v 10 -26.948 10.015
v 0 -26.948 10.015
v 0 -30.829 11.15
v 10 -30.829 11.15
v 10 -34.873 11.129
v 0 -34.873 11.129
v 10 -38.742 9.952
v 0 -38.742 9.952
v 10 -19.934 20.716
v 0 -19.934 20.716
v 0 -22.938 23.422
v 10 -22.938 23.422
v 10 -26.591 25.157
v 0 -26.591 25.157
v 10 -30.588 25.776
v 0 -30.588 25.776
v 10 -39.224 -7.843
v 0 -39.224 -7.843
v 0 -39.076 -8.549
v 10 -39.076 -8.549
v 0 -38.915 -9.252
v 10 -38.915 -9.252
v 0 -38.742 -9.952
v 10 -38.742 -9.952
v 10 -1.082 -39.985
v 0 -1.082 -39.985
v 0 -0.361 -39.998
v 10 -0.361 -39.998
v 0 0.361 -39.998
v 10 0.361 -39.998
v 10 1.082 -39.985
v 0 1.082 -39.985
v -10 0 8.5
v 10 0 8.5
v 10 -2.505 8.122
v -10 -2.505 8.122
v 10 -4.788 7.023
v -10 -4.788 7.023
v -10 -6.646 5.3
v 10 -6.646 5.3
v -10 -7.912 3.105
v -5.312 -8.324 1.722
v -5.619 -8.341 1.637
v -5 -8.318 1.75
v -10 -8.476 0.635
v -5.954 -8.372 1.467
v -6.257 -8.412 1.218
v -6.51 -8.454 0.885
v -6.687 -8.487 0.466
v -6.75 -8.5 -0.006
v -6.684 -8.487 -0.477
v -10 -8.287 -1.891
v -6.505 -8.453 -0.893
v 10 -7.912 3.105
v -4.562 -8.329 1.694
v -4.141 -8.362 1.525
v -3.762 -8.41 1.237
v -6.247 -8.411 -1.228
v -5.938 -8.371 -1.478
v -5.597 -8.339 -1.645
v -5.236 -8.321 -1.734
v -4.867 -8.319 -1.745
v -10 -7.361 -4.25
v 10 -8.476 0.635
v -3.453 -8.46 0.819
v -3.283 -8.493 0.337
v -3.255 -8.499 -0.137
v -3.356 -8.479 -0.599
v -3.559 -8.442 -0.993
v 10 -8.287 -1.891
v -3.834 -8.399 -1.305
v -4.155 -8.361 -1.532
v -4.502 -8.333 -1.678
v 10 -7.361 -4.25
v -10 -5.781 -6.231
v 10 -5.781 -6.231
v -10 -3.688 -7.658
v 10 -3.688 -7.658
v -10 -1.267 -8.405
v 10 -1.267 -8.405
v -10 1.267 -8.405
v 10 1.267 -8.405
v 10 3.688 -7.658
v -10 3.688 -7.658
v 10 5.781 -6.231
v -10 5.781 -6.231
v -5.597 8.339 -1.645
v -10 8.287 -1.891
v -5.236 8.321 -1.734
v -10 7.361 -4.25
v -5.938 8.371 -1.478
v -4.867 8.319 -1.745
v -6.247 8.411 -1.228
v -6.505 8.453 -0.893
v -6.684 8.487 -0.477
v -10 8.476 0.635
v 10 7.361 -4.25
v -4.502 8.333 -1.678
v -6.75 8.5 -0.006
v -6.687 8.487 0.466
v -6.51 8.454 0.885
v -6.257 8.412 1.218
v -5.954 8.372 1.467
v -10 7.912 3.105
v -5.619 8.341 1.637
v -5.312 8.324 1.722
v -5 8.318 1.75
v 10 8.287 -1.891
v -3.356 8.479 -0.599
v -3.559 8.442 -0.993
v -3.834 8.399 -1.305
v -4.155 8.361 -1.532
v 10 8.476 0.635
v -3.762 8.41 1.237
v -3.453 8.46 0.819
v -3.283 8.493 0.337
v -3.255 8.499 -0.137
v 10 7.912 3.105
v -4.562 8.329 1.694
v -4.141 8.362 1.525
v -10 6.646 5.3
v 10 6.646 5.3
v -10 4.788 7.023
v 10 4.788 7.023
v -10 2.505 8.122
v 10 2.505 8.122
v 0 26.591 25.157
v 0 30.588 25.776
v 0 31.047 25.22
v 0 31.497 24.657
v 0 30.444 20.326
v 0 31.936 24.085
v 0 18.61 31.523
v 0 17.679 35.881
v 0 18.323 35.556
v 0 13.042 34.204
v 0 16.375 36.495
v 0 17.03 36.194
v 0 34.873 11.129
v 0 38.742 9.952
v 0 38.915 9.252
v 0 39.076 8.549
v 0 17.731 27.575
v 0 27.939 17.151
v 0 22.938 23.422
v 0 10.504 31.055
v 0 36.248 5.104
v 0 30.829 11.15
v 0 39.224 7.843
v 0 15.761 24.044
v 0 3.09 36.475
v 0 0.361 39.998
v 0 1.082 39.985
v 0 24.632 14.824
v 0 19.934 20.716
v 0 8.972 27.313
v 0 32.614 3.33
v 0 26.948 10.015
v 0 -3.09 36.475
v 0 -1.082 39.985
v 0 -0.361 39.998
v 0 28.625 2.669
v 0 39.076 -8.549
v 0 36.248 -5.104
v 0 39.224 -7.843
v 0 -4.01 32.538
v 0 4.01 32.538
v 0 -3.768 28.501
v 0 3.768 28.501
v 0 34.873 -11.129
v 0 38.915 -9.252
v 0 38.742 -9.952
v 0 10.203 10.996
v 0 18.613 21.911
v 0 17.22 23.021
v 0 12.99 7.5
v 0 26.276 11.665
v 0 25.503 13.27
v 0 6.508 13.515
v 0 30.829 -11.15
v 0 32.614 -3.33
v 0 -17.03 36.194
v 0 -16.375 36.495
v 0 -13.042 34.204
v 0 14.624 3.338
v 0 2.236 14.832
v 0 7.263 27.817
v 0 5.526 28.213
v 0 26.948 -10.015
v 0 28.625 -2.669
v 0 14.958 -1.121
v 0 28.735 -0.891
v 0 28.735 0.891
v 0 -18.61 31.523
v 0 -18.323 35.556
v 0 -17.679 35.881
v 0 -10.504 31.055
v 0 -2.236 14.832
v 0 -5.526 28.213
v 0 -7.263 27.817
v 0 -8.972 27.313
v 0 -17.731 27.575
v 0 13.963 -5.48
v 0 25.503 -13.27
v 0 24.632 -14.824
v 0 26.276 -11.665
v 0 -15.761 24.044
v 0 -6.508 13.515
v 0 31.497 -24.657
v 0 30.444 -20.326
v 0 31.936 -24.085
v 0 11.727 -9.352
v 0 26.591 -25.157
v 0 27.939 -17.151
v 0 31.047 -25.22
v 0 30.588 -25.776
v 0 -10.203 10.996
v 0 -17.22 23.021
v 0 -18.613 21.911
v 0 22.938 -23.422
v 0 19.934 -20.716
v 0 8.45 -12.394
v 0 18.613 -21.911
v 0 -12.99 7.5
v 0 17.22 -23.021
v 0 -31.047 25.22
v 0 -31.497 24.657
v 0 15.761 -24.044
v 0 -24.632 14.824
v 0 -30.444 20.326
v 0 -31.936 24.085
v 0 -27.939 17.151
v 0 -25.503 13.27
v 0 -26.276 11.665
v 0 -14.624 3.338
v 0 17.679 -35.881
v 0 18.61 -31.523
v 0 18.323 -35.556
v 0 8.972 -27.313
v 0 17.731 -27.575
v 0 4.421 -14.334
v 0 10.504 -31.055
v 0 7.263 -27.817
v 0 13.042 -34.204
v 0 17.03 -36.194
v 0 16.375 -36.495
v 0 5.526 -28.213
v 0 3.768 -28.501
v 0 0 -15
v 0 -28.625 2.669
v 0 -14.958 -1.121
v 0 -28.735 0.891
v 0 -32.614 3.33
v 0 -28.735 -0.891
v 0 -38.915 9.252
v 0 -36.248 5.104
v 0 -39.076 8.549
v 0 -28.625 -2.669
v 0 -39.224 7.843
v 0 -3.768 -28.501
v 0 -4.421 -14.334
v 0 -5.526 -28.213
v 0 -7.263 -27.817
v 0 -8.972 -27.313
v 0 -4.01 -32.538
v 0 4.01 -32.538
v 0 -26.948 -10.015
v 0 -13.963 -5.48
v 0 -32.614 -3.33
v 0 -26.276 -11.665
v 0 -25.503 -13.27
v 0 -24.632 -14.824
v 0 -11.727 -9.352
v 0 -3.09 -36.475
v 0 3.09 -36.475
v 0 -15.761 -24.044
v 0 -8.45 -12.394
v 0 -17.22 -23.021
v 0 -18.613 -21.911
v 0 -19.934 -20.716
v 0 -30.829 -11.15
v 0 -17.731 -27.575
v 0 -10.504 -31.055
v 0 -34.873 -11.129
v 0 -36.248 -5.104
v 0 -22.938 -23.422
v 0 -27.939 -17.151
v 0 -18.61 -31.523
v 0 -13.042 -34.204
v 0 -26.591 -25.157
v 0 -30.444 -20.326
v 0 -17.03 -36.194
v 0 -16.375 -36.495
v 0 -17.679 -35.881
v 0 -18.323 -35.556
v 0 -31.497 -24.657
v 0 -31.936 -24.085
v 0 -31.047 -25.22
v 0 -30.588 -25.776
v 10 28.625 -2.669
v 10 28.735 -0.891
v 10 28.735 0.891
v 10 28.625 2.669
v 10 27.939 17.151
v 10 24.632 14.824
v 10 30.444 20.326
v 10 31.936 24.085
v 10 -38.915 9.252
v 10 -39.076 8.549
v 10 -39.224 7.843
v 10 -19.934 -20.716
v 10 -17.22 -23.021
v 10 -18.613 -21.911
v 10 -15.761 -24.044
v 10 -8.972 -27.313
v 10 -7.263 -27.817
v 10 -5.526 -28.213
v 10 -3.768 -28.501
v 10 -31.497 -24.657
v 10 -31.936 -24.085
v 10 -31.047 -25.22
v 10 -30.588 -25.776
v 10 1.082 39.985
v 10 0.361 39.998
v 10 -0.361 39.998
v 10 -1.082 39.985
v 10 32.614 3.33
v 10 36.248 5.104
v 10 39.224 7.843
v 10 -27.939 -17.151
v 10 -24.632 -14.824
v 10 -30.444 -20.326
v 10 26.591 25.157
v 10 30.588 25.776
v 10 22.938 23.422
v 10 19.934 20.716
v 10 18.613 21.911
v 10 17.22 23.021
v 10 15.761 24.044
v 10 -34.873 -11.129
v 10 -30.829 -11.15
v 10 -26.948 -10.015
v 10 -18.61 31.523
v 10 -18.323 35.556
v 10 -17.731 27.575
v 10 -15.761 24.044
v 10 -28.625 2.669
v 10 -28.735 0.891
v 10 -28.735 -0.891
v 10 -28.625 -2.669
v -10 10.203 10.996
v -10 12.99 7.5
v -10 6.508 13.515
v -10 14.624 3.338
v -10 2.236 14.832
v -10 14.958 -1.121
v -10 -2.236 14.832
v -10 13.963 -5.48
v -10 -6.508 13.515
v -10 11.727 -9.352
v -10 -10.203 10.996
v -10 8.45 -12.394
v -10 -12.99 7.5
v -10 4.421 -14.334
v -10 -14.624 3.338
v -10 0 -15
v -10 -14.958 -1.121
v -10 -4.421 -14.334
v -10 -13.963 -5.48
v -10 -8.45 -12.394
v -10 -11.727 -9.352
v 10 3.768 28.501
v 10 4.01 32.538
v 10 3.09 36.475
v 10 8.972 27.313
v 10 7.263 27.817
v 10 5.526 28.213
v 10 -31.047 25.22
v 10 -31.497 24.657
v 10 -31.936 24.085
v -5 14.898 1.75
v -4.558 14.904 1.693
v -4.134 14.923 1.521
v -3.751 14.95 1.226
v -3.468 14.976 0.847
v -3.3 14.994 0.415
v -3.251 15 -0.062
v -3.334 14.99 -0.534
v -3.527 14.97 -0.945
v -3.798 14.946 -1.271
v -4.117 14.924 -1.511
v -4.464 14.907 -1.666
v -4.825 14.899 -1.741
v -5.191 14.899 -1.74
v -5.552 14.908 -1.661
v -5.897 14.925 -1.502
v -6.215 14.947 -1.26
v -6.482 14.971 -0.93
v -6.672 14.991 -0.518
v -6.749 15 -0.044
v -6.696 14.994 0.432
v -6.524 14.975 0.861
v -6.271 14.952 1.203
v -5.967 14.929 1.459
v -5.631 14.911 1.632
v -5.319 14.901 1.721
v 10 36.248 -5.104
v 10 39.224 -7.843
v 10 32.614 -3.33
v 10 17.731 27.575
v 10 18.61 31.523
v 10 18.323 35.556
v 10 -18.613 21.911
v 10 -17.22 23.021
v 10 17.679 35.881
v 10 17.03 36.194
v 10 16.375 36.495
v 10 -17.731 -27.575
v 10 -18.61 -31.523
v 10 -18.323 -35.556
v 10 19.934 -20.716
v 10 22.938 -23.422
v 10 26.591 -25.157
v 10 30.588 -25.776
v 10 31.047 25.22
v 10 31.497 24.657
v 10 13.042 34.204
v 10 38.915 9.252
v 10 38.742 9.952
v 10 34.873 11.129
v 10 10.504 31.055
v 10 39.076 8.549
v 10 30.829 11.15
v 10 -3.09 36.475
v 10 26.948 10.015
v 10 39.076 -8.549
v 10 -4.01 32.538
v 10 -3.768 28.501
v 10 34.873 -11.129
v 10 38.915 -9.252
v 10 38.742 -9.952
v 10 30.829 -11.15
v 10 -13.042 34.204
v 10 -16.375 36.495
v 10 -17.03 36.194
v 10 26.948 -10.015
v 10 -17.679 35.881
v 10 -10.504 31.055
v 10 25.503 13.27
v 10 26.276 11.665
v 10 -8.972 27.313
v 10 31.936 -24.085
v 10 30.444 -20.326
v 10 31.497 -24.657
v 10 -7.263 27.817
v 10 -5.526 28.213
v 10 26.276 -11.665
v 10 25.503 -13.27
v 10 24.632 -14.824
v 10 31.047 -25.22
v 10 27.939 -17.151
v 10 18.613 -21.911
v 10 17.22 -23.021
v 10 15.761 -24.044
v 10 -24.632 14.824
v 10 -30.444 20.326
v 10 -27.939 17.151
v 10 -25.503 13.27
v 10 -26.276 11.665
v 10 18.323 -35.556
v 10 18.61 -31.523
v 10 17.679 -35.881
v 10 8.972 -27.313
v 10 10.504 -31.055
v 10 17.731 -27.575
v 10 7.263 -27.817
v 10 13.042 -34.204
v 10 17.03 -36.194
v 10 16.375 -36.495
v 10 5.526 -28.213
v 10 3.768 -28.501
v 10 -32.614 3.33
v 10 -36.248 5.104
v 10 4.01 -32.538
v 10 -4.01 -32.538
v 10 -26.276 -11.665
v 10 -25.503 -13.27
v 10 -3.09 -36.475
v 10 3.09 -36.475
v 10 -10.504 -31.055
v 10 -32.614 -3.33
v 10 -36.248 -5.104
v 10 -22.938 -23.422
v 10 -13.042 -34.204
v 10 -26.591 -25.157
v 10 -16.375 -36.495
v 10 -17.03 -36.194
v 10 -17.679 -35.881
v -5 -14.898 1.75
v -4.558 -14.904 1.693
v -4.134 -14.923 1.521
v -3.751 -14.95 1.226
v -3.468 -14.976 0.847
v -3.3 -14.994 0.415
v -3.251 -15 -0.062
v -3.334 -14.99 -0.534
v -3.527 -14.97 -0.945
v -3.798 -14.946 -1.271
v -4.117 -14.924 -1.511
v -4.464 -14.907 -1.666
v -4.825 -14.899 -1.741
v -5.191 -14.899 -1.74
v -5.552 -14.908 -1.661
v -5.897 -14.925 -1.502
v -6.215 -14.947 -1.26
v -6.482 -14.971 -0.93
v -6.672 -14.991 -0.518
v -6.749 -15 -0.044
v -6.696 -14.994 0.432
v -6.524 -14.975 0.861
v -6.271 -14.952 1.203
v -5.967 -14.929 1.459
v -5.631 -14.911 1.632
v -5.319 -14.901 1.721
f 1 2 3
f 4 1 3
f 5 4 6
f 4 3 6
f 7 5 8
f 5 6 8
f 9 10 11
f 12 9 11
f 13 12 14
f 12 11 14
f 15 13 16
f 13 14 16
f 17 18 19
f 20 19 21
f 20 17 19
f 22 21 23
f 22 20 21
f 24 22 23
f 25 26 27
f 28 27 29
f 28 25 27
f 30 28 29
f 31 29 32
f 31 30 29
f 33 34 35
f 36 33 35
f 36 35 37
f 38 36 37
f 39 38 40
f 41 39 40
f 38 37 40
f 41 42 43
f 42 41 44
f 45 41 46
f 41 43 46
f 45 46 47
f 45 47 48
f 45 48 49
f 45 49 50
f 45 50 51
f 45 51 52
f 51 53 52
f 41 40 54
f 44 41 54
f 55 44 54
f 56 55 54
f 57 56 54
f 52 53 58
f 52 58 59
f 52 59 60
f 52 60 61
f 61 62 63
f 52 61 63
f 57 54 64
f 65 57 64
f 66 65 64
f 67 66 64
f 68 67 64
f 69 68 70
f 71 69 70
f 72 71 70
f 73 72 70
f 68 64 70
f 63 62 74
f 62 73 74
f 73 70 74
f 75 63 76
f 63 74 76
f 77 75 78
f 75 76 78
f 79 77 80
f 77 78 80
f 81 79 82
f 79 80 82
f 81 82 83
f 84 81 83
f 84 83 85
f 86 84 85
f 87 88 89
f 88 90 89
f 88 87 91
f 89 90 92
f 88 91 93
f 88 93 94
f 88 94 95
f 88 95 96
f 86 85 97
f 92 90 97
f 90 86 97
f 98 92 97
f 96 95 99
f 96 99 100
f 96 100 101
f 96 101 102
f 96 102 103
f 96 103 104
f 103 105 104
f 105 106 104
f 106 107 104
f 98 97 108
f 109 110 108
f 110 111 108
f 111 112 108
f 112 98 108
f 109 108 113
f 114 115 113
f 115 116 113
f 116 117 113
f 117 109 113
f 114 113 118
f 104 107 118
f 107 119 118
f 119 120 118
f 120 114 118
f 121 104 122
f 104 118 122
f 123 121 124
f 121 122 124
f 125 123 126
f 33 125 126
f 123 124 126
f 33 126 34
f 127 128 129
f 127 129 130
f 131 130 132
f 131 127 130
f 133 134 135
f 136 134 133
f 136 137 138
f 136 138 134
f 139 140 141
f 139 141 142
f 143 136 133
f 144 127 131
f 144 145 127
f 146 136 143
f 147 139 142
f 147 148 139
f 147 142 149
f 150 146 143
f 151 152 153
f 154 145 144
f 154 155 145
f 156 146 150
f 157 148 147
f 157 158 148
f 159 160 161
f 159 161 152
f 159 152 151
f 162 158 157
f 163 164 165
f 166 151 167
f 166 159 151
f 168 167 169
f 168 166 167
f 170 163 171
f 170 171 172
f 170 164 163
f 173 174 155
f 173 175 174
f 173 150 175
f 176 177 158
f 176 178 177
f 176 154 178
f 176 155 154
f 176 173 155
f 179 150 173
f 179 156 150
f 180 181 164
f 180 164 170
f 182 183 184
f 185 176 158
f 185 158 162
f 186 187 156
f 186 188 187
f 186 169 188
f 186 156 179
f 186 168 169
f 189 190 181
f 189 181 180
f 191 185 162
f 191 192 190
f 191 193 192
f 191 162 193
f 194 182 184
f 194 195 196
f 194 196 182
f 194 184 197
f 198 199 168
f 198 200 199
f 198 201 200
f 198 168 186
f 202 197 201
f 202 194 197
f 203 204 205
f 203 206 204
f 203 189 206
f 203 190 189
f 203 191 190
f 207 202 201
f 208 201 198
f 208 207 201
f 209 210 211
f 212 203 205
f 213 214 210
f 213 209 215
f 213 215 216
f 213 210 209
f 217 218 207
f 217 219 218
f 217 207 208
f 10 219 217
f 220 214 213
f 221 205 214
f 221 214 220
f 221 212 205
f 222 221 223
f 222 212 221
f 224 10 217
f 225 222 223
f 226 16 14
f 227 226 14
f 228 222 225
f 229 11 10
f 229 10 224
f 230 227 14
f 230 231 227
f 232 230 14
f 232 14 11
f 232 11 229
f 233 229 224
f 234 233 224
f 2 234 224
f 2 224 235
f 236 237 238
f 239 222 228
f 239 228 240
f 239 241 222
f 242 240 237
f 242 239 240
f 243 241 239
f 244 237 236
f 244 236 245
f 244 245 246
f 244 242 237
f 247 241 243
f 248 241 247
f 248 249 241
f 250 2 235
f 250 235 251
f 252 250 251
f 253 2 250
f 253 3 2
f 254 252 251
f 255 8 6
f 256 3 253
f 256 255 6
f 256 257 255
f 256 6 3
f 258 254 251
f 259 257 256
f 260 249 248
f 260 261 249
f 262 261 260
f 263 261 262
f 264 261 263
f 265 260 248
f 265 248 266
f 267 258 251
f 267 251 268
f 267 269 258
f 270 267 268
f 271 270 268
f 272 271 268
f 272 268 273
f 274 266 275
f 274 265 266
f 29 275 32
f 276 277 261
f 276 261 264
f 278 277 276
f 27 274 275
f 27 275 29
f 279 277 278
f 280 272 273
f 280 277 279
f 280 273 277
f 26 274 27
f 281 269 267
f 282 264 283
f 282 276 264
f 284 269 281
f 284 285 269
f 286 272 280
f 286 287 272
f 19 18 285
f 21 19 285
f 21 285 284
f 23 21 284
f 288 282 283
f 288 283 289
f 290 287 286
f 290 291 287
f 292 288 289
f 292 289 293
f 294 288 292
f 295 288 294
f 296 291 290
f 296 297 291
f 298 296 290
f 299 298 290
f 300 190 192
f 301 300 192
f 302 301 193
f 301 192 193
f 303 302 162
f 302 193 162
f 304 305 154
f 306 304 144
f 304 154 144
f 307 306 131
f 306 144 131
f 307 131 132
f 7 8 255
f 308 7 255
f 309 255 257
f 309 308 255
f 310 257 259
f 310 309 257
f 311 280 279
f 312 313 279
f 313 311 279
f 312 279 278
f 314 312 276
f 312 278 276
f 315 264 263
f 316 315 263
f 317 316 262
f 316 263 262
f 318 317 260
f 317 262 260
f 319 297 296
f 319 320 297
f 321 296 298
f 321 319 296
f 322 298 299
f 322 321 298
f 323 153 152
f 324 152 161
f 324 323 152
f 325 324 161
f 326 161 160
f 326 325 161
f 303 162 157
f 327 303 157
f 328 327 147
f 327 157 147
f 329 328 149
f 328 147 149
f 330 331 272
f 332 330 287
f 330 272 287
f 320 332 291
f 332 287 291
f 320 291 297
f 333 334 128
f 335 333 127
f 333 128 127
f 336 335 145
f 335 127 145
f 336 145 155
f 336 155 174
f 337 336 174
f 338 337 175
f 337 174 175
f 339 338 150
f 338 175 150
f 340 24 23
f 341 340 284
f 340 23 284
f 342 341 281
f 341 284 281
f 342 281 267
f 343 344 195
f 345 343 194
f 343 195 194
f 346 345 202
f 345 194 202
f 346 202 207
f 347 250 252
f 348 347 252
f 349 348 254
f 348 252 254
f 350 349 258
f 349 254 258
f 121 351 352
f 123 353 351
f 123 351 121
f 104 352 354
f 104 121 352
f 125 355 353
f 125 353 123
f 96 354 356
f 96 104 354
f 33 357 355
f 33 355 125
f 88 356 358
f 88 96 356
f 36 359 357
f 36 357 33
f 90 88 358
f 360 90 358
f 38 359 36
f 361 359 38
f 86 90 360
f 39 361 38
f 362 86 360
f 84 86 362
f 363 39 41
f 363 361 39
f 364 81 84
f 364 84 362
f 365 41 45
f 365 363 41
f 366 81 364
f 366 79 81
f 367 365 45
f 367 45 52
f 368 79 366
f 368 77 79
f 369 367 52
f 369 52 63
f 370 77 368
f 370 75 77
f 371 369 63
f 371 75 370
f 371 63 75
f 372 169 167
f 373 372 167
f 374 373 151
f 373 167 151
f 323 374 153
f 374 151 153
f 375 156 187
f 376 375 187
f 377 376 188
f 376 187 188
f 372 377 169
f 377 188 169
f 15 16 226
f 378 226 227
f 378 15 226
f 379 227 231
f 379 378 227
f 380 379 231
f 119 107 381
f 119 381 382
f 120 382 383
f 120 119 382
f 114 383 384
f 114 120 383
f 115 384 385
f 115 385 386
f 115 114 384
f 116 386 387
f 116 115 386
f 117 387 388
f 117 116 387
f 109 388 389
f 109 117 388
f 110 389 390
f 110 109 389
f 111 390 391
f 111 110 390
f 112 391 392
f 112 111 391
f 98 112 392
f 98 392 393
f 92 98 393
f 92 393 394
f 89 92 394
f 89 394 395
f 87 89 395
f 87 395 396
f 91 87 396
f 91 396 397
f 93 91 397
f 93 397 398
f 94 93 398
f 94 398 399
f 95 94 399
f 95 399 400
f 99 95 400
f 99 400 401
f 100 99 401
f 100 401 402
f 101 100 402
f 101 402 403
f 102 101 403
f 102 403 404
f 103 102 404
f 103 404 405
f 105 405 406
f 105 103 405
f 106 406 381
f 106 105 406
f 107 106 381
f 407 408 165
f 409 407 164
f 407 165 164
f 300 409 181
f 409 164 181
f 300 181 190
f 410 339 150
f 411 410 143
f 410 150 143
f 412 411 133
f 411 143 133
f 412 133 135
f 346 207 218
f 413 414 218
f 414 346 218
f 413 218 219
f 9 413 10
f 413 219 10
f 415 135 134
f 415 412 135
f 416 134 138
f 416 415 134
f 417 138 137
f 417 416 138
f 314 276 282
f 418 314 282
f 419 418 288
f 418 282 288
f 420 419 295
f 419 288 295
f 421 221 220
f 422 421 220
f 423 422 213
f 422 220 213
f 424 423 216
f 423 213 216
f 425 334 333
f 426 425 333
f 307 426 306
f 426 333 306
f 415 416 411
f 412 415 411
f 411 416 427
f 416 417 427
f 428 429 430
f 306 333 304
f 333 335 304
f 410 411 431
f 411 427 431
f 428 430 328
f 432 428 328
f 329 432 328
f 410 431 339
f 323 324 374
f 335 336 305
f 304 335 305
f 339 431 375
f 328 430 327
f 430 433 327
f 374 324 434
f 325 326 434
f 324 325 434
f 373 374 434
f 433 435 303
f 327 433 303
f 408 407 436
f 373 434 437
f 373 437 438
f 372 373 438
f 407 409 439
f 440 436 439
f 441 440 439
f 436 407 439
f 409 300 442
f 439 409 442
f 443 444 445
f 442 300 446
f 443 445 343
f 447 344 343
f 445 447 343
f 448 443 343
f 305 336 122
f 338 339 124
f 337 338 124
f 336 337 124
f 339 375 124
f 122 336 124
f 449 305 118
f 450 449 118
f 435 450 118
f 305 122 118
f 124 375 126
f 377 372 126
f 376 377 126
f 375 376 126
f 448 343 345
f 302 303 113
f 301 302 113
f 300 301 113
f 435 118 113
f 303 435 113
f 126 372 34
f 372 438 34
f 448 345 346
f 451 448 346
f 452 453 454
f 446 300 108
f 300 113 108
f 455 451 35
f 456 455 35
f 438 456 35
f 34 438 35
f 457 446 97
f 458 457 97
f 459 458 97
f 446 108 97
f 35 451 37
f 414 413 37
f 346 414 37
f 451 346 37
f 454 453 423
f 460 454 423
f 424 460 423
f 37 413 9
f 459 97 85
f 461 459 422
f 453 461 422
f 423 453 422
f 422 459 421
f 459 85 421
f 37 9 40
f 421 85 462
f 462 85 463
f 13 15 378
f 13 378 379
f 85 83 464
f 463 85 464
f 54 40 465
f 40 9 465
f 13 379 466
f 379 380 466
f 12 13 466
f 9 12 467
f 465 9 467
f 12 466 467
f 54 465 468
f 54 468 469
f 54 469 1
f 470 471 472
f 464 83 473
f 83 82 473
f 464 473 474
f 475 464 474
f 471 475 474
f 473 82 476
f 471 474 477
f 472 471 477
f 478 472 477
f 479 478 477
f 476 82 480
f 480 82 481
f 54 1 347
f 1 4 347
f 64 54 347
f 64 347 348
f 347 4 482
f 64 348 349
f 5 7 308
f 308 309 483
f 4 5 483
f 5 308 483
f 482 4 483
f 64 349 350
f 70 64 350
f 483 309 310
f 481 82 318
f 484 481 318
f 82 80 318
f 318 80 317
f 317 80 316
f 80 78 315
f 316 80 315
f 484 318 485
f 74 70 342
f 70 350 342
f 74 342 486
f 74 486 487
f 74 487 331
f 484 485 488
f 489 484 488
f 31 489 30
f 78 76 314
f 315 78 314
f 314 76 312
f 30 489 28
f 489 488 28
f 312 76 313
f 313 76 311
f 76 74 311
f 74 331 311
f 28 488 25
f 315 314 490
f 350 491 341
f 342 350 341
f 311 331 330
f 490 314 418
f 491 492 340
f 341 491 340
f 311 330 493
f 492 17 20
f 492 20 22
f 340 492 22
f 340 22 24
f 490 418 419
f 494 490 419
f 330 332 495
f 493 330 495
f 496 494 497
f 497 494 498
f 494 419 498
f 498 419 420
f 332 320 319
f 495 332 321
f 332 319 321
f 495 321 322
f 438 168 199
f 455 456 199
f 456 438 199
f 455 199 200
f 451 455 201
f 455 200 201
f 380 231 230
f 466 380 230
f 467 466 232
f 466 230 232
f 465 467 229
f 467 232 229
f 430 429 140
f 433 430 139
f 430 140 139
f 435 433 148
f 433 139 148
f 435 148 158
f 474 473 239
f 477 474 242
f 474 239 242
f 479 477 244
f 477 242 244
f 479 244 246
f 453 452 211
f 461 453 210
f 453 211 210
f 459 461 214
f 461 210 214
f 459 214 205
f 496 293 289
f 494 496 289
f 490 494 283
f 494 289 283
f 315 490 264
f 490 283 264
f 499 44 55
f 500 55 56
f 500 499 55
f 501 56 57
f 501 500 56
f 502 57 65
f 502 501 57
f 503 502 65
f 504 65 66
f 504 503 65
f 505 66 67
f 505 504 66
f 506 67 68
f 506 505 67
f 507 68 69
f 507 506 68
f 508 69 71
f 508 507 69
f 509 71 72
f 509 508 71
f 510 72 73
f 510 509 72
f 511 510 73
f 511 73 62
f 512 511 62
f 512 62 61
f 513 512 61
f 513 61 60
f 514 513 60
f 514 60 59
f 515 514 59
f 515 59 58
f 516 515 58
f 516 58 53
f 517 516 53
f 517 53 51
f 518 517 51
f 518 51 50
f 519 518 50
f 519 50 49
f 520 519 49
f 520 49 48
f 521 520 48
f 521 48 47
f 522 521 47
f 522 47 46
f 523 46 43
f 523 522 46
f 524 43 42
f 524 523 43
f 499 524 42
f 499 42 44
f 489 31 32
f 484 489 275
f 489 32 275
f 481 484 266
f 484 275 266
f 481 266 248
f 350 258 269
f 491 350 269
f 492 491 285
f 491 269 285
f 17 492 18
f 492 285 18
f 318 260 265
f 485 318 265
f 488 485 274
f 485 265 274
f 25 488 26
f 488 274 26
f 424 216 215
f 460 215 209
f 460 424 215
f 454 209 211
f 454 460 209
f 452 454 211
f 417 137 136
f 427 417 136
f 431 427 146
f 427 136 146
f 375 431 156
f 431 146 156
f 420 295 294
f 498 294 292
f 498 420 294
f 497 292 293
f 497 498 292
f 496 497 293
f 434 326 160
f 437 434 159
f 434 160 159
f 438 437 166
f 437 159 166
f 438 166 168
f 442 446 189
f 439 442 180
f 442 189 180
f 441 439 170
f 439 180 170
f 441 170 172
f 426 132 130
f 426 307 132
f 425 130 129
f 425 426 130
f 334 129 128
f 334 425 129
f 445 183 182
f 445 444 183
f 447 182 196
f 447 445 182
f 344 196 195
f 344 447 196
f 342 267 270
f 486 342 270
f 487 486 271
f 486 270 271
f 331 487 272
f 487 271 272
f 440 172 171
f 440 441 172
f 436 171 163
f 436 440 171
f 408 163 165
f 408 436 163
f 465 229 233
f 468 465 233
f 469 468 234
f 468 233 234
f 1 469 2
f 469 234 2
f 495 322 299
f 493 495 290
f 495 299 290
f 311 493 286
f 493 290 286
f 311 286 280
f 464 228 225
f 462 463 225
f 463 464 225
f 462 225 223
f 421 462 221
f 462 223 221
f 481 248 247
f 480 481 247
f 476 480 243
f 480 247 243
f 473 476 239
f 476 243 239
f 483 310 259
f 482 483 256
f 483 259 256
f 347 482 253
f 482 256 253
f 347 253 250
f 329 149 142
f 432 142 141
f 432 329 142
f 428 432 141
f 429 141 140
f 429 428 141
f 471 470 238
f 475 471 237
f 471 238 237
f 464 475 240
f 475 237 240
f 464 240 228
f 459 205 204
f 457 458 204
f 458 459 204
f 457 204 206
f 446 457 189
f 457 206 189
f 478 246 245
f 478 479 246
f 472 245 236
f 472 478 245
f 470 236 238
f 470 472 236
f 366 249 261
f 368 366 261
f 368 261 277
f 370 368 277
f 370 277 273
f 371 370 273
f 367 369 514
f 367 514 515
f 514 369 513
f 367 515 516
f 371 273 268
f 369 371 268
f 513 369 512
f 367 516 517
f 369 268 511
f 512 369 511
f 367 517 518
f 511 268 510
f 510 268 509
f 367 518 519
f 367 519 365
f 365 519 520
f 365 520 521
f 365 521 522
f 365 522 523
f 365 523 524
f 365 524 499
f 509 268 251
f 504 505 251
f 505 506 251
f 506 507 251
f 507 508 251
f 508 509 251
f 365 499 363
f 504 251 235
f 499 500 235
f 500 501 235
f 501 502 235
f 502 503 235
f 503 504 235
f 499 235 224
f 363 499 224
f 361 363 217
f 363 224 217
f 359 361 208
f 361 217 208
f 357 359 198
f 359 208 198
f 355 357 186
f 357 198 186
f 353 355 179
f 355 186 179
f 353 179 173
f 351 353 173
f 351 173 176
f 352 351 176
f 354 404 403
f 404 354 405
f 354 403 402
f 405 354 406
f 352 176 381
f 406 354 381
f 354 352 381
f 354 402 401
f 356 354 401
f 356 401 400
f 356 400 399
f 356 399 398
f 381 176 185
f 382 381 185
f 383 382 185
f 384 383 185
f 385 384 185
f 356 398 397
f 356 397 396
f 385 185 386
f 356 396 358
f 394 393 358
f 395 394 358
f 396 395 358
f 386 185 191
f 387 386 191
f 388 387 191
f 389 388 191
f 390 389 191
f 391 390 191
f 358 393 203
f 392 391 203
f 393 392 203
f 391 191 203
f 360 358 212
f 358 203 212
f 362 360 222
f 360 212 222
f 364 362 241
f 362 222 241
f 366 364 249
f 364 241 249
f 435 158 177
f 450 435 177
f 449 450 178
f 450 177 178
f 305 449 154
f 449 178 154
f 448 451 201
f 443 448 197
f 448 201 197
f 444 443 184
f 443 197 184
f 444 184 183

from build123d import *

# Parameters (mm, degrees)
BASPROSKE_W             = 10
BASPROSKE_H             = 40
TOOTHCUT_DEPTH          = 58.445626465
TEETHCUTS_COUNT         = 14
HUBNEAONESKE_R          = 15
HUBNEARONE_DEPTH        = 10.0000508
BORSKE_R                = 8.5
BORE_DEPTH              = 20.0000508
CUT_EXTRUDE1_DEPTH      = 57.907695162
CUT_EXTRUDE1_DEPTH_BACK = 57.907695162
SKETCH1_R               = 1.75


with BuildPart() as part:
    # BasProSke → Base-Revolve (revolve)
    with BuildSketch(Plane(origin=(0, 0, 0), x_dir=(1, 0, 0), z_dir=(0, 1, 0)), mode=Mode.PRIVATE) as base_revolve_sk:
        with Locations((5, 20)):
            Rectangle(BASPROSKE_W, BASPROSKE_H)
    revolve(base_revolve_sk.sketch.rotate(Axis((-10, 0, 0), (1, 0, 0)), 180), axis=Axis((-10, 0, 0), (1, 0, 0)))

    # TooCutSke → ToothCut (cut, through all)
    with BuildSketch(Plane(origin=(0, 0, 0), x_dir=(0, 0, -1), z_dir=(1, 0, 0))):
        with BuildLine():
            ThreePointArc((2.668955068, 28.624843752), (0, 28.749), (-2.668955068, 28.624843752))
            ThreePointArc((-2.668955068, 28.624843752), (-4.092749085, 34.510467305), (-7.86881342, 39.244291566))
            ThreePointArc((-7.86881342, 39.244291566), (0, 40.0254), (7.86881342, 39.244291566))
            ThreePointArc((7.86881342, 39.244291566), (4.092749085, 34.510467305), (2.668955068, 28.624843752))
        make_face()
    toothcut = extrude(amount=TOOTHCUT_DEPTH, mode=Mode.SUBTRACT)

    # TeethCuts: ToothCut ×14 about axis
    teethcuts_axis = Axis((0, 0, 0), (1, 0, 0))
    for i in range(1, TEETHCUTS_COUNT):
        add(toothcut.rotate(teethcuts_axis, i * 360 / TEETHCUTS_COUNT), mode=Mode.SUBTRACT)

    # HubNeaOneSke → HubNearOne (add)
    with BuildSketch(Plane.ZY):
        with Locations(Location((0, 0, 0), (0, 0, 180))):
            Circle(HUBNEAONESKE_R)
    extrude(amount=HUBNEARONE_DEPTH)

    # BorSke → Bore (cut, symmetric)
    with BuildSketch(Plane(origin=(0, 0, 0), x_dir=(0, 0, -1), z_dir=(1, 0, 0))):
        with Locations(Location((0, 0, 0), (0, 0, 180))):
            Circle(BORSKE_R)
    extrude(amount=BORE_DEPTH, both=True, mode=Mode.SUBTRACT)

    # Sketch1 → Cut-Extrude1 (cut, two sides: drawn at the far end of the back side and taken through both)
    with BuildSketch(Plane(origin=(0, 0, 0), x_dir=(1, 0, 0), z_dir=(0, 1, 0)).offset(-CUT_EXTRUDE1_DEPTH_BACK)):
        with Locations(Location((-5.0000508, 0, 0), (0, 0, 270))):
            Circle(SKETCH1_R)
    extrude(amount=CUT_EXTRUDE1_DEPTH + CUT_EXTRUDE1_DEPTH_BACK, mode=Mode.SUBTRACT)


solid = part.part
